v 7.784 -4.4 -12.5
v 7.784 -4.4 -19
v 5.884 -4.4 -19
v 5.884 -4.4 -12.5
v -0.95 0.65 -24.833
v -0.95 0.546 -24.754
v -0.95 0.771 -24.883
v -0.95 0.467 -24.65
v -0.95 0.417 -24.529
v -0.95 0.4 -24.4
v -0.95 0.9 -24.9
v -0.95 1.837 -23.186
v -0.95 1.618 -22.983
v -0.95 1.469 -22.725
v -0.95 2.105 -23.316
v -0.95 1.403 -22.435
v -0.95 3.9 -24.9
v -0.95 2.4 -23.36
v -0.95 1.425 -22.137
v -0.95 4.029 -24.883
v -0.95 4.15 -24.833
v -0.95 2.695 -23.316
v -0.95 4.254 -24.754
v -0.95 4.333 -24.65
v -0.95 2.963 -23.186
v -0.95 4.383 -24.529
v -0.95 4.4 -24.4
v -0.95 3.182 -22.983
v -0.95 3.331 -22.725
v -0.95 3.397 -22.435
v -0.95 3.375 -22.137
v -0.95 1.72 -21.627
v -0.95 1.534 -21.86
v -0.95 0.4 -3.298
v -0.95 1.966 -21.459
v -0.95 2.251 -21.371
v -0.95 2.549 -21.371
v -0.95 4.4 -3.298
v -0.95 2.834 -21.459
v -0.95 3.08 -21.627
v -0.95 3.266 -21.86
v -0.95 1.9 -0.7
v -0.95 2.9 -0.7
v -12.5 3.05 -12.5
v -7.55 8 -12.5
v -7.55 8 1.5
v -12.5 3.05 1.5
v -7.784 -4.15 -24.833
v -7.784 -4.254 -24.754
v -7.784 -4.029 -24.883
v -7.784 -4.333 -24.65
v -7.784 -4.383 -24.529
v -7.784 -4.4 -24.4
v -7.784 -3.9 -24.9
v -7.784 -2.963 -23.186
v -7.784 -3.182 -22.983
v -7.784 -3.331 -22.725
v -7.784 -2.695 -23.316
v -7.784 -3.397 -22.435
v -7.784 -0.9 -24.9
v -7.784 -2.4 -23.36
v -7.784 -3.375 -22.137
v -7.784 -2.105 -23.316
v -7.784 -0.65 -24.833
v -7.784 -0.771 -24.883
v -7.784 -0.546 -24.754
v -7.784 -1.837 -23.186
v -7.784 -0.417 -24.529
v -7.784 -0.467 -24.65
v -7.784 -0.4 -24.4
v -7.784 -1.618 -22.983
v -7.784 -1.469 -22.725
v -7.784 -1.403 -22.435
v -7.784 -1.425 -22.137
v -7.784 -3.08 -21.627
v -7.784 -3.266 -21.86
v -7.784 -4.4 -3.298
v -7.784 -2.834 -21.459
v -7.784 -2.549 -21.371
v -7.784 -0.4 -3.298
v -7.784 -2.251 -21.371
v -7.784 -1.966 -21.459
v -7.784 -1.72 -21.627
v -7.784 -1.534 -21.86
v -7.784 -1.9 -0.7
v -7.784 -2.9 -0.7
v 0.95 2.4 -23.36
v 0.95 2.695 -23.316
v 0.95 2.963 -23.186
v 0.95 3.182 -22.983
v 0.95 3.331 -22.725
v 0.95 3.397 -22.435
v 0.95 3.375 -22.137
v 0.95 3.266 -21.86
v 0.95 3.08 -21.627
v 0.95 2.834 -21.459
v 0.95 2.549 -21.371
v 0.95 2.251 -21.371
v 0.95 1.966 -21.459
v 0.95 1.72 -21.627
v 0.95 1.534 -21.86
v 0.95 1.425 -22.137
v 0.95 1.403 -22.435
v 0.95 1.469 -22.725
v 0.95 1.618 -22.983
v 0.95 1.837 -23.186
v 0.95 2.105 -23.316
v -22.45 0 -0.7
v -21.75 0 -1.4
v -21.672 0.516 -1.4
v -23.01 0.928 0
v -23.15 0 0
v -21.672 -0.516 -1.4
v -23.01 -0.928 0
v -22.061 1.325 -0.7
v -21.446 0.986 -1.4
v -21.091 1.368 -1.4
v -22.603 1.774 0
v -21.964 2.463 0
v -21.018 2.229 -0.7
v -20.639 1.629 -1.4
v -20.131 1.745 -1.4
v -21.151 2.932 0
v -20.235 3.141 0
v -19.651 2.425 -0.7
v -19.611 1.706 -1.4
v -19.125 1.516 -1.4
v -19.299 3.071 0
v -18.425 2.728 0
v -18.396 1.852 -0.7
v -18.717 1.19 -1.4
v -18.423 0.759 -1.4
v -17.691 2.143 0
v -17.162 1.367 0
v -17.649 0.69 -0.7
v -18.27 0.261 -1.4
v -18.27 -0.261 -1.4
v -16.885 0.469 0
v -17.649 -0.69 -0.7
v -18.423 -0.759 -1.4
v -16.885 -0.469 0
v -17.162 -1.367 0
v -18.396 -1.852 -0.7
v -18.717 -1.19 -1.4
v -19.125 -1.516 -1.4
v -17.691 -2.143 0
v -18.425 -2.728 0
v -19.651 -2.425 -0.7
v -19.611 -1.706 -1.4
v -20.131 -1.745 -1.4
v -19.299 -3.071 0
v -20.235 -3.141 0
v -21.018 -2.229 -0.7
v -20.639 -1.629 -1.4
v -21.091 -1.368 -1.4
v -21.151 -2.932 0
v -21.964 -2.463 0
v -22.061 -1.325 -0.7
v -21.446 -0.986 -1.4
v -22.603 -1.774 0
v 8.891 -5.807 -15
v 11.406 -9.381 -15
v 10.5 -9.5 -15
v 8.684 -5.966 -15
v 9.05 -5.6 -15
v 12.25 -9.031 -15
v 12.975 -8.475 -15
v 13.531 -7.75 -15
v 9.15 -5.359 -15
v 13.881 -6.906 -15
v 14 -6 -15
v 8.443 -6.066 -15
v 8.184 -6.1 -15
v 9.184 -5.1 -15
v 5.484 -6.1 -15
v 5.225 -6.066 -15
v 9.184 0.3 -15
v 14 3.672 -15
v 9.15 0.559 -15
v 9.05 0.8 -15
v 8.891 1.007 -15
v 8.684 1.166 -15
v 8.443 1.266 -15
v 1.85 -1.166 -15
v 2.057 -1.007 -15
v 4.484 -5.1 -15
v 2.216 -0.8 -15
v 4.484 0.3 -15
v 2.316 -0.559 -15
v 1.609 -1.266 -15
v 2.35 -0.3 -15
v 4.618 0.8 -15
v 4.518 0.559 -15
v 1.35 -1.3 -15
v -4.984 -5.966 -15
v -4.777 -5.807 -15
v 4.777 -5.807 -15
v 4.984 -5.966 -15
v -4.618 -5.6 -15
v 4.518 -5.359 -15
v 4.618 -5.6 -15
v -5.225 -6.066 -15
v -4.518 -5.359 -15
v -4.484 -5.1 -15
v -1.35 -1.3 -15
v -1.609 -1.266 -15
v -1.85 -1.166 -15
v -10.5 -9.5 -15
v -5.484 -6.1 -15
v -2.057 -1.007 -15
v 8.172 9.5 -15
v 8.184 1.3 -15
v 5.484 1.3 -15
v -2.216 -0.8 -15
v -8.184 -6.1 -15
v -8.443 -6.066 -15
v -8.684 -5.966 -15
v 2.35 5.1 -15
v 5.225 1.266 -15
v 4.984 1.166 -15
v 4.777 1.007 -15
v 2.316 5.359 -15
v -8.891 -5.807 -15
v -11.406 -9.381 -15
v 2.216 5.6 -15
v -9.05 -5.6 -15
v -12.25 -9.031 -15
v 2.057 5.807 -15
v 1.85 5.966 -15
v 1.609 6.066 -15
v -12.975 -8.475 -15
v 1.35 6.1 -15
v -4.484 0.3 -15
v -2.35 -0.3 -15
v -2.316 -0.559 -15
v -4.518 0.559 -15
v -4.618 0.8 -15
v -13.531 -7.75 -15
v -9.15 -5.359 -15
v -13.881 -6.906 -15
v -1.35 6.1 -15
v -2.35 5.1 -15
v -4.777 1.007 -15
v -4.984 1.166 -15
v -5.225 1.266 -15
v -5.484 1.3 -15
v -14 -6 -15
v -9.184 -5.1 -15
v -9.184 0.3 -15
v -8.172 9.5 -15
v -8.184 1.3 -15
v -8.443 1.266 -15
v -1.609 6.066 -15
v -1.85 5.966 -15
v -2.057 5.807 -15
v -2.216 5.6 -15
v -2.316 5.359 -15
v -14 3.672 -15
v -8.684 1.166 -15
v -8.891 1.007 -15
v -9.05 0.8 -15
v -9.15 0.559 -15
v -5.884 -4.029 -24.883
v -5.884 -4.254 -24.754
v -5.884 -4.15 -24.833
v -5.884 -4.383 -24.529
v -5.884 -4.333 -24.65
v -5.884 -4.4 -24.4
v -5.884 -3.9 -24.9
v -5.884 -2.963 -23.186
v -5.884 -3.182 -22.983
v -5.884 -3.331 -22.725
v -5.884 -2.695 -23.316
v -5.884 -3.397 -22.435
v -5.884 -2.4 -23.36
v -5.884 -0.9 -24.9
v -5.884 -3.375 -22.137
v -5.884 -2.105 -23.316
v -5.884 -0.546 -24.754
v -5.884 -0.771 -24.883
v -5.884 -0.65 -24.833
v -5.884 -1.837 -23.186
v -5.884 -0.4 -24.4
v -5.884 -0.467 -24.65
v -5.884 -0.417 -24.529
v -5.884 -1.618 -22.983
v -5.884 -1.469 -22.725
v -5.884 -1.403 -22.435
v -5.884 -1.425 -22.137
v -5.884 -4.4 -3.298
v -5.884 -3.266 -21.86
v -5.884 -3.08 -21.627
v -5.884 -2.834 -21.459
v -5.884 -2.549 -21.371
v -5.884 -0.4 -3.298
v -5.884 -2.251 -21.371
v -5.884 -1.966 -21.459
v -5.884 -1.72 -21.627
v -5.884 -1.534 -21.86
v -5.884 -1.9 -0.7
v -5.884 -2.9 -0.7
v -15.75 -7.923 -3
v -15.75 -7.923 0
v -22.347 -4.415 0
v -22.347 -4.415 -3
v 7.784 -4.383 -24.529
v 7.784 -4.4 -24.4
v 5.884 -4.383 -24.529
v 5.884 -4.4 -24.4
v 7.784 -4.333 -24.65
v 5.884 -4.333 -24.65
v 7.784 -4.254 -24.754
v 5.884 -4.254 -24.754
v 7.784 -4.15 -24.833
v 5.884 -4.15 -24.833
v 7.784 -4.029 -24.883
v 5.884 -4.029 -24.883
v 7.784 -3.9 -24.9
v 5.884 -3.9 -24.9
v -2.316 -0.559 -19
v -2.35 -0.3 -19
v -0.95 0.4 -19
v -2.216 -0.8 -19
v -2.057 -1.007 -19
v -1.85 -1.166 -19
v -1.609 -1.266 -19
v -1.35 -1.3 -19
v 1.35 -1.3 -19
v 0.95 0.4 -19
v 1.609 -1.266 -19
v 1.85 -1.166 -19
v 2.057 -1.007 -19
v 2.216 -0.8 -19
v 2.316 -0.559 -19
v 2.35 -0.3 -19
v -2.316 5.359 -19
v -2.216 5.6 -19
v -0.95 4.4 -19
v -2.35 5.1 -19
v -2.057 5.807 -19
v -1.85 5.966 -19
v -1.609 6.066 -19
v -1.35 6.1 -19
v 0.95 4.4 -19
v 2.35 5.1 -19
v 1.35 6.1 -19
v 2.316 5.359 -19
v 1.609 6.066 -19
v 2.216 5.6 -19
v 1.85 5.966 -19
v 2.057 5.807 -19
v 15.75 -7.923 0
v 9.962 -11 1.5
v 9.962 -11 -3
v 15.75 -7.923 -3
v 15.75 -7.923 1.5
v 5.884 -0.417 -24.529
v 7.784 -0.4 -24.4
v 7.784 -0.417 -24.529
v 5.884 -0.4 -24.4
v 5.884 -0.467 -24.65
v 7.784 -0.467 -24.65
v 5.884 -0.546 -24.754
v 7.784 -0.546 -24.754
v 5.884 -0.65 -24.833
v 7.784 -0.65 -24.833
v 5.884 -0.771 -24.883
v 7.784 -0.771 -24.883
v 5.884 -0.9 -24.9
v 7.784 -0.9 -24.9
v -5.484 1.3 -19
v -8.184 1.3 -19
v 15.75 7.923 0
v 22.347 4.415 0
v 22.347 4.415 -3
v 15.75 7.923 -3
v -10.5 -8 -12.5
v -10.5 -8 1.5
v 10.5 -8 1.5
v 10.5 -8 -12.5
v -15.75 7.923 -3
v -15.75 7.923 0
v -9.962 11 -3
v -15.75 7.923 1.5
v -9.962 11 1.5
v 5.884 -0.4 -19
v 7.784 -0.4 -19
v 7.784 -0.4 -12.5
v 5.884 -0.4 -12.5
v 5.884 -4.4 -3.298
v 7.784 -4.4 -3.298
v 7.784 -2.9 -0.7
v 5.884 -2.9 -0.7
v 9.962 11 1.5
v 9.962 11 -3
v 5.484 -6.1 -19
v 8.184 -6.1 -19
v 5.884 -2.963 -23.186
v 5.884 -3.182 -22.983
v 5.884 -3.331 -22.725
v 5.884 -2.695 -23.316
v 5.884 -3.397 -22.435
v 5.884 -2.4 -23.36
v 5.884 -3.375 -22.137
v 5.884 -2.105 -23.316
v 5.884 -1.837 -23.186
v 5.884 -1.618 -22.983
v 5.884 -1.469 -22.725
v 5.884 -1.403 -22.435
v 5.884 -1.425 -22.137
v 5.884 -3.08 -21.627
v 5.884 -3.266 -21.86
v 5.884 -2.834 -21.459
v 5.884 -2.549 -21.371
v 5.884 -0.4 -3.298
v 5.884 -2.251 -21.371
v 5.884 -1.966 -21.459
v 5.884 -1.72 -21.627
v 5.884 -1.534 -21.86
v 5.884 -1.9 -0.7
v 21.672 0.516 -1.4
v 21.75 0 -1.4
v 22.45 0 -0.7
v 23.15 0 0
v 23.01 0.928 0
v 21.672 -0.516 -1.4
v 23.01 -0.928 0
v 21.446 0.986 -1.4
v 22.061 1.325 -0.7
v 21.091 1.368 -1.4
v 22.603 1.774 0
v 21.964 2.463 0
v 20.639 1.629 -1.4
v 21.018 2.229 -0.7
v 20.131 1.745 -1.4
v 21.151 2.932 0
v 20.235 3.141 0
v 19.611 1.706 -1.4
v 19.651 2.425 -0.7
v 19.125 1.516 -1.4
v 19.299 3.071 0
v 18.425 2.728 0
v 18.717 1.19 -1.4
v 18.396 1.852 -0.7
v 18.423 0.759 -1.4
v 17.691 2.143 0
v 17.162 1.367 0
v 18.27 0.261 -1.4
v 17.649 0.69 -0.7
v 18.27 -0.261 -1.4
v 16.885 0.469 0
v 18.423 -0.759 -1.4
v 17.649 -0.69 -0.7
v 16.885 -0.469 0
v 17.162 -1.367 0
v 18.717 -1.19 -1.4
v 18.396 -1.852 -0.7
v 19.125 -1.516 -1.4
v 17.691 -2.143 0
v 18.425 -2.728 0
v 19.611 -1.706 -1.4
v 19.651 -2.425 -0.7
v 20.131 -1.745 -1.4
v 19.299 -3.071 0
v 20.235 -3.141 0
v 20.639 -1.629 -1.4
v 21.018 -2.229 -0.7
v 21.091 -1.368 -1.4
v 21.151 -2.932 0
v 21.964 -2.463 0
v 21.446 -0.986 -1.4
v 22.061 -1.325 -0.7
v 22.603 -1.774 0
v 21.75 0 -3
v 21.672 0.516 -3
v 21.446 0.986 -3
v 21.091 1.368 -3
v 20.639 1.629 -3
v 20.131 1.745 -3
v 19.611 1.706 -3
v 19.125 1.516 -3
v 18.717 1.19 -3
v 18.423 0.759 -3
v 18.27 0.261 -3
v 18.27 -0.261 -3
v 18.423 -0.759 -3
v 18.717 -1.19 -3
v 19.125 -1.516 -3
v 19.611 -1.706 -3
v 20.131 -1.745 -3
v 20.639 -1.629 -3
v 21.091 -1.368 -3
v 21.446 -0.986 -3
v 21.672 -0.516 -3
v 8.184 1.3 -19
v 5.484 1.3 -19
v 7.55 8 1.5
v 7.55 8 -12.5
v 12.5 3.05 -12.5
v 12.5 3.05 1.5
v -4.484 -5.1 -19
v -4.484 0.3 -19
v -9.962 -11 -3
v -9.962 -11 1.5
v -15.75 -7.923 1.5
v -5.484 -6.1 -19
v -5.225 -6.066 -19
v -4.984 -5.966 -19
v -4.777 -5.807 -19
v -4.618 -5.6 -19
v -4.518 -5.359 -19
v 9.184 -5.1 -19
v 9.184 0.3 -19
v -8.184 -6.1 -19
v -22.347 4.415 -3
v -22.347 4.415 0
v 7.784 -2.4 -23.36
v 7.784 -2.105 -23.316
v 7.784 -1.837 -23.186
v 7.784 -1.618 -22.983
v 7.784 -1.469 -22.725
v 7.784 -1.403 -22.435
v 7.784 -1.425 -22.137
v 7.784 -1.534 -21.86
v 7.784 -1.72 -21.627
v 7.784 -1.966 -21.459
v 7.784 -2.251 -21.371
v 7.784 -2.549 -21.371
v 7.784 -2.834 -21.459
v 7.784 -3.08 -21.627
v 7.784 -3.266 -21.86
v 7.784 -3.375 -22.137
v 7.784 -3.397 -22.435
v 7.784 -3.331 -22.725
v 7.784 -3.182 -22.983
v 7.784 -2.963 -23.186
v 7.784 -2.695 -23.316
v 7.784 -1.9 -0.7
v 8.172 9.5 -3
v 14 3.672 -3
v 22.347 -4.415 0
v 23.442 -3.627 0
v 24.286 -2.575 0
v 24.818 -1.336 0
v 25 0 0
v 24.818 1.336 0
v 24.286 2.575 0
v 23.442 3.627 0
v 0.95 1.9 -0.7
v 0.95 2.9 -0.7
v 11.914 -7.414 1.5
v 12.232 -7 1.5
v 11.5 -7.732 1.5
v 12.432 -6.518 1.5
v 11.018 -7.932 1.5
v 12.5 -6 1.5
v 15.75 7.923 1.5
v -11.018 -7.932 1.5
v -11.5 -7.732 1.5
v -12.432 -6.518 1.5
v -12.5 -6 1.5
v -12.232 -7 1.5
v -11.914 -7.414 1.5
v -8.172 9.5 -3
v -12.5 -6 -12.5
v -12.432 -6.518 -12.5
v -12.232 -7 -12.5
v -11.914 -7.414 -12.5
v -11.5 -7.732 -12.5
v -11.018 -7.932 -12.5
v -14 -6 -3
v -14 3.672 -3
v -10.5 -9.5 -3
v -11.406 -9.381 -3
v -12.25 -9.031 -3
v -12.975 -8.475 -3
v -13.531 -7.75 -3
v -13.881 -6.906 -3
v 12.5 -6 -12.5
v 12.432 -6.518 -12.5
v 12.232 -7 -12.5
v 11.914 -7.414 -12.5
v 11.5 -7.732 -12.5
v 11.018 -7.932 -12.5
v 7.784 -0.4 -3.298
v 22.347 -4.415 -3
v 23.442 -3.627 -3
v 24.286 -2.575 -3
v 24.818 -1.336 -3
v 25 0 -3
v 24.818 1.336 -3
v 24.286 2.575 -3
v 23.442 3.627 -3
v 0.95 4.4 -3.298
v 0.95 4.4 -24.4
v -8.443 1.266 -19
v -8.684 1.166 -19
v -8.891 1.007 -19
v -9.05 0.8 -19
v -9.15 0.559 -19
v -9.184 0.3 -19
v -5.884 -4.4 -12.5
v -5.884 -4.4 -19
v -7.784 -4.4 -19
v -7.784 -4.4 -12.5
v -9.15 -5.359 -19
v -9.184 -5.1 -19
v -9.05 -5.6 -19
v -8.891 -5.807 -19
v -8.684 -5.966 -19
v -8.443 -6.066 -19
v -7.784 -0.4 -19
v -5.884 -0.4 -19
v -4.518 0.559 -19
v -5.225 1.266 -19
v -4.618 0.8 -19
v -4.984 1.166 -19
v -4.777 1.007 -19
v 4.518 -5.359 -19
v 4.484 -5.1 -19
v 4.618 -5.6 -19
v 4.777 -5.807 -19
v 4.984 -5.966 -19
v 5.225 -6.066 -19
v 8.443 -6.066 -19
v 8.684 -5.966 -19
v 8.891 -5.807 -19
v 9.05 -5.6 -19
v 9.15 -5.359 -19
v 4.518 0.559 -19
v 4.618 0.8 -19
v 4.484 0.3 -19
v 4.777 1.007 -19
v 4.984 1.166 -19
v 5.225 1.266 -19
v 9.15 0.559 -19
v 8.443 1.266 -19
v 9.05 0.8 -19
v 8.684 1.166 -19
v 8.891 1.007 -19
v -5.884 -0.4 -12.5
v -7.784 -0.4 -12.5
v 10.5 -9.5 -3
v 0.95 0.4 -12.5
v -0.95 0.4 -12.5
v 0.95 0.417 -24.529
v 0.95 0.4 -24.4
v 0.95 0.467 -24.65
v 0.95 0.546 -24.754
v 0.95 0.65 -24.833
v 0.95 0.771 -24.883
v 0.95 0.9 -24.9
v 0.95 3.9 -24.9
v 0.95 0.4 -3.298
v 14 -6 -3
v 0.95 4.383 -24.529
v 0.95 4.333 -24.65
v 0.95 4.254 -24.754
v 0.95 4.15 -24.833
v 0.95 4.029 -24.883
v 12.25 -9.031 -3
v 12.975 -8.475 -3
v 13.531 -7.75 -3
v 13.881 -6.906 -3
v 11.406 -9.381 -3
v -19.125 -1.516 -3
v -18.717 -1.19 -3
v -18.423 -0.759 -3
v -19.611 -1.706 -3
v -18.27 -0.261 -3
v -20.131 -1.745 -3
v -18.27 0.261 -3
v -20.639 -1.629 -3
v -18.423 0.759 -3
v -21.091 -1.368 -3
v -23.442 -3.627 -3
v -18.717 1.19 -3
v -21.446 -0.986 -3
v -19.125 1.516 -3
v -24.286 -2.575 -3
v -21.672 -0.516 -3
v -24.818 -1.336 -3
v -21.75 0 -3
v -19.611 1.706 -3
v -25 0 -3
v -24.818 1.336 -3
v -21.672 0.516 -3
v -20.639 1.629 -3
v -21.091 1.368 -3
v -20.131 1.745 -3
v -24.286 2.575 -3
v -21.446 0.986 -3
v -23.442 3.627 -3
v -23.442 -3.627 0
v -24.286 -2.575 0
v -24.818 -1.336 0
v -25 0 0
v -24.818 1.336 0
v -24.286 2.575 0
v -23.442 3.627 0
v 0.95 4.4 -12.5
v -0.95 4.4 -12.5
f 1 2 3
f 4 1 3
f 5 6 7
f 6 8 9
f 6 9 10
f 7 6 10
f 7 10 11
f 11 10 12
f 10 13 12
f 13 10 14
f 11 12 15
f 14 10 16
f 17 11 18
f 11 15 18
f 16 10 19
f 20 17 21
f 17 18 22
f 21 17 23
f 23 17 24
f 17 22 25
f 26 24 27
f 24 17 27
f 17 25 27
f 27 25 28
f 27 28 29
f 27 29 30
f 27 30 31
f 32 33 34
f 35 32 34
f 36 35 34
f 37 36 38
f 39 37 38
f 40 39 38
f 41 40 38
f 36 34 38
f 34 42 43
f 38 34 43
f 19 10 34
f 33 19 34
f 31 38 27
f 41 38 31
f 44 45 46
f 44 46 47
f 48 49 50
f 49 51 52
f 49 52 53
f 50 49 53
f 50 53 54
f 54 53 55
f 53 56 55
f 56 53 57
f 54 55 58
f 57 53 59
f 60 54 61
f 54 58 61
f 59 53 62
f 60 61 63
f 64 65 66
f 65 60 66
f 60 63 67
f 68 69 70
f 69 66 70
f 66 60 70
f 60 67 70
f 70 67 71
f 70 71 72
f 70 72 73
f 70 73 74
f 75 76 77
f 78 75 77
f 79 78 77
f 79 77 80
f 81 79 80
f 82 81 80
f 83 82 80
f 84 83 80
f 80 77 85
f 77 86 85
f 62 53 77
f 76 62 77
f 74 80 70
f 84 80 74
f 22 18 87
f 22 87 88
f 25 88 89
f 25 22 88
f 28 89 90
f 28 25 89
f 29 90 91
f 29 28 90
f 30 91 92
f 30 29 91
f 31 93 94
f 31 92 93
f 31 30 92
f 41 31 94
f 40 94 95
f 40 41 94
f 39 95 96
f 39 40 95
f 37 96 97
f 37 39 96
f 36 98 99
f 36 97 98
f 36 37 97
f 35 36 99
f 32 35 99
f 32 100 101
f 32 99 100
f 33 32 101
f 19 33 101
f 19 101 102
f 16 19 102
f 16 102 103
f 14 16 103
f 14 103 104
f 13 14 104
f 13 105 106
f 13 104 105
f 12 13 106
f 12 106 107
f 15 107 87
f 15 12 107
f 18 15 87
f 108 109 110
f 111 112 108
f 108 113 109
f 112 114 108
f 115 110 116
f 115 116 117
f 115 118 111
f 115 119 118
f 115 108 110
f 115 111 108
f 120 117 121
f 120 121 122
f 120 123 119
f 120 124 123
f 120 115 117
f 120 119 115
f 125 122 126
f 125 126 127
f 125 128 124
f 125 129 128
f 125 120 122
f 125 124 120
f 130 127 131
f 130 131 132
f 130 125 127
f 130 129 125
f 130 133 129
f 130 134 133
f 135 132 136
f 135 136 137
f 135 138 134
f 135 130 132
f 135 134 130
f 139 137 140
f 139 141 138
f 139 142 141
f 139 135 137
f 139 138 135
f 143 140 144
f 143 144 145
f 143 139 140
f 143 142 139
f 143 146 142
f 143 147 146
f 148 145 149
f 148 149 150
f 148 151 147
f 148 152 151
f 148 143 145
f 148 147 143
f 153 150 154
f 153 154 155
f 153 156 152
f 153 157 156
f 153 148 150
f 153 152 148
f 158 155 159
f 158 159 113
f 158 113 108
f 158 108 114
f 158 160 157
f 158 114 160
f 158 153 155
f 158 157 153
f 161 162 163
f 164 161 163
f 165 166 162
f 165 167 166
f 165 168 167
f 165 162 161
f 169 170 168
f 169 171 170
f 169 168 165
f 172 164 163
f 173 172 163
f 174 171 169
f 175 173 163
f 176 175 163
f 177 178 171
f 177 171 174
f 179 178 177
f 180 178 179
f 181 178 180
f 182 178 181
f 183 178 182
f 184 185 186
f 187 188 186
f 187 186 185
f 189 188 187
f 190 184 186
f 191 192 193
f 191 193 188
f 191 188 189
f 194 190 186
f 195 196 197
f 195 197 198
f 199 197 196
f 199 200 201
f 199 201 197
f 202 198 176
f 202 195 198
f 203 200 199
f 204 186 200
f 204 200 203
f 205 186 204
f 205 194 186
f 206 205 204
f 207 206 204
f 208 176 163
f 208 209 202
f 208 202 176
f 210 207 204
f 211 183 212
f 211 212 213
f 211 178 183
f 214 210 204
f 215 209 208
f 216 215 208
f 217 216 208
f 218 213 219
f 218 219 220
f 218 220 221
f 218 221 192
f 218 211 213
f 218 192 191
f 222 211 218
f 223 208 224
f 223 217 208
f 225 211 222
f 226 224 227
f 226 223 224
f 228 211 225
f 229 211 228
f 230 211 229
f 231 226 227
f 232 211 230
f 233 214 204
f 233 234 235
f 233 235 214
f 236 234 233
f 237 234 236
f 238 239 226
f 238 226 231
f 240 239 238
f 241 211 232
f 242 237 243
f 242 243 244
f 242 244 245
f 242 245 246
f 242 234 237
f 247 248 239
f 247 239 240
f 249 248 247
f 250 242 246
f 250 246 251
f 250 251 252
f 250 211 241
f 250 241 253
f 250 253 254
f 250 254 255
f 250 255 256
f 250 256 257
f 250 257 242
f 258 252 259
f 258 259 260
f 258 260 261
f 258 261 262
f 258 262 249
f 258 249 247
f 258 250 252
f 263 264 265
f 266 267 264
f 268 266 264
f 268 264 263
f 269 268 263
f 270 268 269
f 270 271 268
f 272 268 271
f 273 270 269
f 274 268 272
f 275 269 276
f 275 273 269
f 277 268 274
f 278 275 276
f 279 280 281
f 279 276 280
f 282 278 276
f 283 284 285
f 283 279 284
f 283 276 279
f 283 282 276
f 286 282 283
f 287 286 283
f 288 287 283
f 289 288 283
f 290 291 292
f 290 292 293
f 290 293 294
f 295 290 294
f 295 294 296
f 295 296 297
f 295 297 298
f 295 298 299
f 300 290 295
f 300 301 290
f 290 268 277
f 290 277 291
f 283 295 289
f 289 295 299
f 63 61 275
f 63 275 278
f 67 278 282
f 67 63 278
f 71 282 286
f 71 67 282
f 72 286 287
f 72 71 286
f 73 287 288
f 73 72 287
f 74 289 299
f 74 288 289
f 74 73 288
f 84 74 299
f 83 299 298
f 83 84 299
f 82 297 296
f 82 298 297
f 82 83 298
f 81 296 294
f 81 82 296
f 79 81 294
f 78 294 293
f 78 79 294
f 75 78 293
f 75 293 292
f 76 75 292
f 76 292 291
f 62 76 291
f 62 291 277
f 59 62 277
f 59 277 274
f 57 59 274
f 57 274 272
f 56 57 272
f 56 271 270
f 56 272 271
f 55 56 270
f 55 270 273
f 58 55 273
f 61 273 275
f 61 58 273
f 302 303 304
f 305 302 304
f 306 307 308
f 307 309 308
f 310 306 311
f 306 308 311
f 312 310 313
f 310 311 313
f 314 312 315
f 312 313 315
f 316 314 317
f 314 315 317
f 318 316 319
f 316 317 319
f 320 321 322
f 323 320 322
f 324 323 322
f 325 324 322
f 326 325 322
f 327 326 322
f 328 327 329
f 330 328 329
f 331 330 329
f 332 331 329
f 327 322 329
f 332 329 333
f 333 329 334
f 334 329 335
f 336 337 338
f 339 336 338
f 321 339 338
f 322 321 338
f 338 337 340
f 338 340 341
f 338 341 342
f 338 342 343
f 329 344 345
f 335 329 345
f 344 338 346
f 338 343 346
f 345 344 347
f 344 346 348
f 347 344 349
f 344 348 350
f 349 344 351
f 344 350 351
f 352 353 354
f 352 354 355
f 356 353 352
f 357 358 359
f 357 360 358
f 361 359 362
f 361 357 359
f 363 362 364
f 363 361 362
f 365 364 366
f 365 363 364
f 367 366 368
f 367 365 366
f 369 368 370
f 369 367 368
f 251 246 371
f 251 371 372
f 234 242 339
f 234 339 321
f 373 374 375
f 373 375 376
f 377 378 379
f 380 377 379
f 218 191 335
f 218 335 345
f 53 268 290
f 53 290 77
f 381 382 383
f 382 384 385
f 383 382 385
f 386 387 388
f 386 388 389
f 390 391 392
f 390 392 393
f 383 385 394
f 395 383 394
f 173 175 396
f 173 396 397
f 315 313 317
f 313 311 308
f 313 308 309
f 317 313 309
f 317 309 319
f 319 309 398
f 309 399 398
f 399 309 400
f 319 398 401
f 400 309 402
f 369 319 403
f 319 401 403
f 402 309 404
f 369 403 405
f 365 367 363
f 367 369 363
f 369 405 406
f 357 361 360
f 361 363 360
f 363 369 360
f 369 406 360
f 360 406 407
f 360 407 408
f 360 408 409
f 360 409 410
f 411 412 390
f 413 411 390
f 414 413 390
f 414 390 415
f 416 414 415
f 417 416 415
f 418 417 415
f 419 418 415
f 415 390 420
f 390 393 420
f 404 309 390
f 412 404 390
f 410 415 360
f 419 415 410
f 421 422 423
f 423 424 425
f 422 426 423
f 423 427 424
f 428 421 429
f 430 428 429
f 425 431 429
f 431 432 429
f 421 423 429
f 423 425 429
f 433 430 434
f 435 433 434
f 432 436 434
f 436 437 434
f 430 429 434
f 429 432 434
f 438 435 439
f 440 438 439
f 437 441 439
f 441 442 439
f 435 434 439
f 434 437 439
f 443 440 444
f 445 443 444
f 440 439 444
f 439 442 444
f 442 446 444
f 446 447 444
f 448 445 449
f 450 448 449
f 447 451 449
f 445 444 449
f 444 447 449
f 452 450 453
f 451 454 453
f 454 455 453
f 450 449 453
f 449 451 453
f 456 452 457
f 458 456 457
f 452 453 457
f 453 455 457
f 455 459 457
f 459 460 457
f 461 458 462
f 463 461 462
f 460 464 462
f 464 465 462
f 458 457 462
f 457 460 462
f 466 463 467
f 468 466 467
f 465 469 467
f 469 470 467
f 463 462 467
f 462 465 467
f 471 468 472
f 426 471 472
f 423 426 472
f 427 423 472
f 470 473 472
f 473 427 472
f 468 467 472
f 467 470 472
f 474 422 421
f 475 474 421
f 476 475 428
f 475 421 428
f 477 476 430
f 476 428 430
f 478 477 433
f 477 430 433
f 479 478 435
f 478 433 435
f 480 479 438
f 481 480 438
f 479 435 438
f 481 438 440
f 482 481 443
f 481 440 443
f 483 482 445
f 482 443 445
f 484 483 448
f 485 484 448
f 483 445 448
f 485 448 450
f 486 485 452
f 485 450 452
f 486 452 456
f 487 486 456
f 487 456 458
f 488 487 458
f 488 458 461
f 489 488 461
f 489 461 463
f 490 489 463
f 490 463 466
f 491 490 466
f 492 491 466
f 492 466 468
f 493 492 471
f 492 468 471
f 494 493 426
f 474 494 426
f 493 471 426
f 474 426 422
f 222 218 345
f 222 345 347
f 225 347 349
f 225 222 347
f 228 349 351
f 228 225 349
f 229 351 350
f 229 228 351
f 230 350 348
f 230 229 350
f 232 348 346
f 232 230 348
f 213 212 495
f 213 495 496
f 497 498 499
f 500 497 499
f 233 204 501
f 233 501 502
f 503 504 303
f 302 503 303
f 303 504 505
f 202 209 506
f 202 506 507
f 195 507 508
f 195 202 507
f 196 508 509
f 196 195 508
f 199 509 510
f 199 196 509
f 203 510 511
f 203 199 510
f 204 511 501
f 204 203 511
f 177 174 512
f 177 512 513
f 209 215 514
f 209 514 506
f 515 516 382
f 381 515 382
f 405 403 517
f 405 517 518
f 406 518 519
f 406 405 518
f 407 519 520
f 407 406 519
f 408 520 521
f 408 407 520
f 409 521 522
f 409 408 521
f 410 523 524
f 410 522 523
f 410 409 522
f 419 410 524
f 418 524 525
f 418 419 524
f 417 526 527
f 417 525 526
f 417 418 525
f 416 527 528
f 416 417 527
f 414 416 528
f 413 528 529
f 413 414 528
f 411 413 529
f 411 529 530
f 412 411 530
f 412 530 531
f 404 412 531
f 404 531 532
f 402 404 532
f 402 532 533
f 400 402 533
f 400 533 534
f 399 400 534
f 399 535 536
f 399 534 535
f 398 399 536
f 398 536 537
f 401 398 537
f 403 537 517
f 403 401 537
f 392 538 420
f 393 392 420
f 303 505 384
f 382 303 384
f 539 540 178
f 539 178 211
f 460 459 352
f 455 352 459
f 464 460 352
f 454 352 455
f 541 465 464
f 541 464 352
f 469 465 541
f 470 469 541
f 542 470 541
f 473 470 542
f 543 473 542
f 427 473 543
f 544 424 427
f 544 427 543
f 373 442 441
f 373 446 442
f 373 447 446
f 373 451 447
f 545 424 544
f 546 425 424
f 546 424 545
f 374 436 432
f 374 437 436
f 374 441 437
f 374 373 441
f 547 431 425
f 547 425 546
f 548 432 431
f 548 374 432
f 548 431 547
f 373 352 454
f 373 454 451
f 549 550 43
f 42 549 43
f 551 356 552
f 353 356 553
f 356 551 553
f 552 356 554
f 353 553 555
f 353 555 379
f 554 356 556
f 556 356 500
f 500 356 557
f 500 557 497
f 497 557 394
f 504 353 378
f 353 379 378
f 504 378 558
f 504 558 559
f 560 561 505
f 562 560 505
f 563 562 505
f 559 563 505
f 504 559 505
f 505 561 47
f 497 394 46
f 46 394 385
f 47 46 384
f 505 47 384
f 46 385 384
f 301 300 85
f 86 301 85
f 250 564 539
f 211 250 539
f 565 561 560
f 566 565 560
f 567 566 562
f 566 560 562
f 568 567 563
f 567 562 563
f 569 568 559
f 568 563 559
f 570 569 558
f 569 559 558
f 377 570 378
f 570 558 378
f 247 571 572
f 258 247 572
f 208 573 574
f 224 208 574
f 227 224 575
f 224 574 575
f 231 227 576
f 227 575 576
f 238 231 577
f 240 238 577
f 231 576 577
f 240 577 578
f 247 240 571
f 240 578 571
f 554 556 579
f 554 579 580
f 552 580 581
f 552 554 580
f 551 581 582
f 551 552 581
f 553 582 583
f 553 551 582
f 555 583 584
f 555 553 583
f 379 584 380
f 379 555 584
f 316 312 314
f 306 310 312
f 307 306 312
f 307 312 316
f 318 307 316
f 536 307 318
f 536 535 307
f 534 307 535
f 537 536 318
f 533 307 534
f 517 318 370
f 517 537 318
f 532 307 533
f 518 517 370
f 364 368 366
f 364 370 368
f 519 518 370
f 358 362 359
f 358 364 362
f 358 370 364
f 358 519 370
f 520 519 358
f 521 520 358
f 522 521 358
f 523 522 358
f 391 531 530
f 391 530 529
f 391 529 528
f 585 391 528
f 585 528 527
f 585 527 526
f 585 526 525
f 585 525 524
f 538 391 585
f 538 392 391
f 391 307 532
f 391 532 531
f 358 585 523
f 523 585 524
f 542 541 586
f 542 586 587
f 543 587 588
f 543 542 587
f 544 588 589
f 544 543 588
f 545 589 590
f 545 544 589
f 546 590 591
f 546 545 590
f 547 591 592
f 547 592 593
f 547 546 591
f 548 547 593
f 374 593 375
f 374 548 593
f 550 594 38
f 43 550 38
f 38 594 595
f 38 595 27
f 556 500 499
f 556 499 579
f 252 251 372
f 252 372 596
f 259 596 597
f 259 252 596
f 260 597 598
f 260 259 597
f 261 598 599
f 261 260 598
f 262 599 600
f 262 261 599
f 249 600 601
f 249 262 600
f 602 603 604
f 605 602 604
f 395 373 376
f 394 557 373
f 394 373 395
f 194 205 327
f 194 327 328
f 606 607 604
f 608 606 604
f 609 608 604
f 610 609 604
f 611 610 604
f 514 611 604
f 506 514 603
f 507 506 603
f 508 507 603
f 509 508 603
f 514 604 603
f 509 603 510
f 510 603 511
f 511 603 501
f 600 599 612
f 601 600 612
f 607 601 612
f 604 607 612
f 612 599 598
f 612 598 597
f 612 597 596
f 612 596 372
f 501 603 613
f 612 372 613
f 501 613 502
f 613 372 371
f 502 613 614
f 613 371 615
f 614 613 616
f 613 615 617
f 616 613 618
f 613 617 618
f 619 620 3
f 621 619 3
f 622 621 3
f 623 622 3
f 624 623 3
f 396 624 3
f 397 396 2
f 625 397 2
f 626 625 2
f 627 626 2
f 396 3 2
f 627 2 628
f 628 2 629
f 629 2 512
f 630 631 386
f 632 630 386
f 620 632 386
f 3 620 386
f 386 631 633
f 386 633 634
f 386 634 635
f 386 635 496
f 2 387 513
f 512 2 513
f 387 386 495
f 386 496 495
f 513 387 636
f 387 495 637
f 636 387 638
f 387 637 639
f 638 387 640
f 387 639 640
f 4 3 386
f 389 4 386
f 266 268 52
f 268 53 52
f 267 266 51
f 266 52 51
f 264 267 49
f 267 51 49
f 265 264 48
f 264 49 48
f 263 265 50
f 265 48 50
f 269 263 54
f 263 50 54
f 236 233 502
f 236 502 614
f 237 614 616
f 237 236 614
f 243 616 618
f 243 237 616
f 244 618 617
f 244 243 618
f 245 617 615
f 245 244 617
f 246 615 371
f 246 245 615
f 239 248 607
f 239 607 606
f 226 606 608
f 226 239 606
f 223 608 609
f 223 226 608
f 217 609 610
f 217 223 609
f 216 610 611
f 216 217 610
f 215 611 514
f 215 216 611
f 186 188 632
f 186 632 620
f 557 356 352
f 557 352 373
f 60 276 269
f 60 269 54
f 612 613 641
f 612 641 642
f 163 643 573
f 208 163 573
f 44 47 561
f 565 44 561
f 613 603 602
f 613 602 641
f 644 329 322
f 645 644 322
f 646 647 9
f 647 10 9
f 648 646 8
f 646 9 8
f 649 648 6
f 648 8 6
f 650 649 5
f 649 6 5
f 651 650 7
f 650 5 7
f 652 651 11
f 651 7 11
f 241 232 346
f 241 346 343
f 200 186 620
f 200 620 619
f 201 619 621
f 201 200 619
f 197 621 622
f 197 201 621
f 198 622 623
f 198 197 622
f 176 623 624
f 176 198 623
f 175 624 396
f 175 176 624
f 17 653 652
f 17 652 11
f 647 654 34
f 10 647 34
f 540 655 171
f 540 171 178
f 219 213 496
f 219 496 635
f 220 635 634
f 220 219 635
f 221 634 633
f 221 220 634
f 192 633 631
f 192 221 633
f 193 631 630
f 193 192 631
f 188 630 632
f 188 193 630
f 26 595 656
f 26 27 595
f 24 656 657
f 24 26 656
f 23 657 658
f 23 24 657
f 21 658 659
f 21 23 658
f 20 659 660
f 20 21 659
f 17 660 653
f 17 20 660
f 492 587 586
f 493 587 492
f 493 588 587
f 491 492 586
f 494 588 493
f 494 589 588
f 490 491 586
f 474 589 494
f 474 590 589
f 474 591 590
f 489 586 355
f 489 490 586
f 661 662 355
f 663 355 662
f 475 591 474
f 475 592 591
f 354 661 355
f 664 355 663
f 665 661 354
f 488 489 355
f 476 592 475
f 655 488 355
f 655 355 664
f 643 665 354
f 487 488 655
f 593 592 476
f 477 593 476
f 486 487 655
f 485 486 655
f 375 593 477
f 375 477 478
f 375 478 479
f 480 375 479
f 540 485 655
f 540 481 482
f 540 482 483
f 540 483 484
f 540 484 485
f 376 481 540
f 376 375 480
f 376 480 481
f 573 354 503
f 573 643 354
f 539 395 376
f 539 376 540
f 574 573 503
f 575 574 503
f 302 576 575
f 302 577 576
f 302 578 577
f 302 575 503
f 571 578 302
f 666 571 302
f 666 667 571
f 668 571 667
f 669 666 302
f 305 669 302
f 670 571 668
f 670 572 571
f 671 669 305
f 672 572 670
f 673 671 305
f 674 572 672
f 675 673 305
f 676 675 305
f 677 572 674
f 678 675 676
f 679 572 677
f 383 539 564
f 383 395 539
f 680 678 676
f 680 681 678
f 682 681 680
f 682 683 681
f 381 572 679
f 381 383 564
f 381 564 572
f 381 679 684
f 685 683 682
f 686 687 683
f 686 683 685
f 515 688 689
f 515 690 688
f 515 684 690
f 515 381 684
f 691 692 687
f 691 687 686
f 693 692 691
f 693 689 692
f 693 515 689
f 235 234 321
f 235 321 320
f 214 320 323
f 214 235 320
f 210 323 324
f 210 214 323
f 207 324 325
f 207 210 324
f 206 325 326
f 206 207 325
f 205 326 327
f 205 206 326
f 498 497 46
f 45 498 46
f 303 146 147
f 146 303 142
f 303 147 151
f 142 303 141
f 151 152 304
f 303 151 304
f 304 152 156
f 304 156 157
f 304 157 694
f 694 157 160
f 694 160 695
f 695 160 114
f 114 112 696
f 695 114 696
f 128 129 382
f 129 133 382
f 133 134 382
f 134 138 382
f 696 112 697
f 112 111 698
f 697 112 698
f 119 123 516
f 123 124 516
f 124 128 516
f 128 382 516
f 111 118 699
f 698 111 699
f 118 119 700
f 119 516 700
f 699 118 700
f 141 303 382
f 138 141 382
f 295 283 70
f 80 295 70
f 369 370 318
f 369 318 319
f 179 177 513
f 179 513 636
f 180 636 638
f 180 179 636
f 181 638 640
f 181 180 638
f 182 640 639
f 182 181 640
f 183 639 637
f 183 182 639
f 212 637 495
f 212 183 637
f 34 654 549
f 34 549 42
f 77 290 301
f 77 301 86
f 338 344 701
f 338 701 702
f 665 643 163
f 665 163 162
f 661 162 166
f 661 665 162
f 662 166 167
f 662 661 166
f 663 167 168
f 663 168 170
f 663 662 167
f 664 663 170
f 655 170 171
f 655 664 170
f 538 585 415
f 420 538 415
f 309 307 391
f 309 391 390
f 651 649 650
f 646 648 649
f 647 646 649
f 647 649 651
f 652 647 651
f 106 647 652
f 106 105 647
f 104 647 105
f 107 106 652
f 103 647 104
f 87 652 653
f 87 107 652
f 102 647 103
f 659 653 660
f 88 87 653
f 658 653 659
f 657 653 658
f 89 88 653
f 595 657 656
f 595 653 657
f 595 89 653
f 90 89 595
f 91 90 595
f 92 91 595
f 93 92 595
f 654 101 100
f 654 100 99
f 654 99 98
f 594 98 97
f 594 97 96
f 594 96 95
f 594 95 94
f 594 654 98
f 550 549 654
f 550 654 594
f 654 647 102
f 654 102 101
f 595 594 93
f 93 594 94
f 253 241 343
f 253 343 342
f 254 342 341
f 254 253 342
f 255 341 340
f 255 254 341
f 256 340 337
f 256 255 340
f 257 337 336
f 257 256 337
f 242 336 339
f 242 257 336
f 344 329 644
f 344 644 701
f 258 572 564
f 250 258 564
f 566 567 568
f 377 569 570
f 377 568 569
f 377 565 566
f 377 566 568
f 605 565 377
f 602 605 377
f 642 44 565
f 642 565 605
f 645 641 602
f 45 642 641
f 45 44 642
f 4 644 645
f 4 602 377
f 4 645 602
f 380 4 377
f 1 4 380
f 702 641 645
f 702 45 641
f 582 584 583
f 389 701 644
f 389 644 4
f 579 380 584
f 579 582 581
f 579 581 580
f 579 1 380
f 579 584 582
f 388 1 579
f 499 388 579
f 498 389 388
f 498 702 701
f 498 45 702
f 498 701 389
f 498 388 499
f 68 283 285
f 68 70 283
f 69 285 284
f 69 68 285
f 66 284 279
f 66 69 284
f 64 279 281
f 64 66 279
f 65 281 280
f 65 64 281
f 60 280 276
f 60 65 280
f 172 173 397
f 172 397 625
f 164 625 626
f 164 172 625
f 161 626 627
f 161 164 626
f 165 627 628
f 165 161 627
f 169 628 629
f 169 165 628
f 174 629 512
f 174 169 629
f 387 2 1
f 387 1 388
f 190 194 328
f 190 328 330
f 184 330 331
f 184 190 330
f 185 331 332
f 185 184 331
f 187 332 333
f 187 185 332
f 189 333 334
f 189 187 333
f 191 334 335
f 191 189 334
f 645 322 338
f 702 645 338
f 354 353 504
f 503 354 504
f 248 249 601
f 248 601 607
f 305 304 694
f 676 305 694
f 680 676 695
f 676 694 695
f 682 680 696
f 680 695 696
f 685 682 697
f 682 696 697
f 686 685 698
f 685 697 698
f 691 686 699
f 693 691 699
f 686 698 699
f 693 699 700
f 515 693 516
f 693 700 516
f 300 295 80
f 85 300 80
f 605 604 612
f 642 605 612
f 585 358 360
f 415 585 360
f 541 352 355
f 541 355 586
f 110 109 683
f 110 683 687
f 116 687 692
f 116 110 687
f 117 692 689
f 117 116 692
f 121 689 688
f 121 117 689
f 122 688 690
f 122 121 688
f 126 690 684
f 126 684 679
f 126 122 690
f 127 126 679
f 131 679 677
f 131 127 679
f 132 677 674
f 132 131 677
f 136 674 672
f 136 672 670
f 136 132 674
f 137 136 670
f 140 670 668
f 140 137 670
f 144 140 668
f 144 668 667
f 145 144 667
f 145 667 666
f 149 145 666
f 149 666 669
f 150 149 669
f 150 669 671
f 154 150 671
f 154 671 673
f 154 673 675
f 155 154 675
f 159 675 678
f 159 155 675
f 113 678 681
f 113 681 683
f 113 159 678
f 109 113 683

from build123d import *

# Parameters (mm, degrees)
SKETCH1_R                  = 1.75
BOSS_EXTRUDE1_DEPTH        = 3
BOSS_EXTRUDE2_START        = 1.5
BOSS_EXTRUDE2_DEPTH        = 1.5
BOSS_EXTRUDE3_DEPTH        = 15
BOSS_EXTRUDE4_START        = -2.5
BOSS_EXTRUDE4_DEPTH        = 2.5
CHAMFER2_SIZE              = 1.4
SKETCH4_W                  = 1.9
SKETCH4_H                  = 4
BOSS_EXTRUDE5_DEPTH        = 4
SKETCH4_2_W                = 1.9
SKETCH4_2_H                = 4
CUT_EXTRUDE1_DEPTH         = 32.910029771
BOSS_EXTRUDE6_DEPTH        = 9.9
BOSS_EXTRUDE6_DEPTH_BACK   = 14.3
SKETCH4_3_W                = 1.9
SKETCH4_3_H                = 4
BOSS_EXTRUDE6_2_DEPTH      = 9.9
BOSS_EXTRUDE6_2_DEPTH_BACK = 14.3
BOSS_EXTRUDE6_3_DEPTH      = 9.9
BOSS_EXTRUDE6_3_DEPTH_BACK = 14.3
FILLET1_R                  = 0.5
FILLET2_R                  = 0.5
FILLET3_R                  = 0.5
CUT_EXTRUDE2_DEPTH         = 37.959572508
CUT_EXTRUDE2_DEPTH_BACK    = 37.959572508
SKETCH5_R                  = 1
CHAMFER3_SIZE              = 1.5
CHAMFER3_SIZE2             = 2.598076211
CHAMFER4_SIZE              = 1.5
CHAMFER4_SIZE2             = 2.598076211
CHAMFER5_SIZE              = 1.5
CHAMFER5_SIZE2             = 2.598076211


with BuildPart() as part:
    # Sketch1 → Boss-Extrude1 (new body)
    # profile 1 of 3: a face of its own
    with BuildSketch(Plane.XY):
        with BuildLine():
            Line((15.75, 7.922615338), (9.962281222, 11))
            Line((9.962281222, 11), (0, 11))
            Line((0, 11), (0, 9.5))
            Line((0, 9.5), (8.171572875, 9.5))
            Line((8.171572875, 9.5), (14, 3.671572875))
            Line((14, 3.671572875), (14, -6))
            ThreePointArc((14, -6), (12.974873734, -8.474873734), (10.5, -9.5))
            Line((10.5, -9.5), (0, -9.5))
            Line((0, -9.5), (0, -11))
            Line((0, -11), (9.962281222, -11))
            Line((9.962281222, -11), (15.75, -7.922615338))
            Line((15.75, -7.922615338), (15.75, 7.922615338))
        make_face()
    # profile 2 of 3: a face of its own
    with BuildSketch(Plane.XY):
        with BuildLine():
            Line((8.171572875, 9.5), (0, 9.5))
            Line((0, 9.5), (0, 8))
            Line((0, 8), (7.550252532, 8))
            Line((7.550252532, 8), (12.5, 3.050252532))
            Line((12.5, 3.050252532), (12.5, -6))
            ThreePointArc((12.5, -6), (11.914213562, -7.414213562), (10.5, -8))
            Line((10.5, -8), (0, -8))
            Line((0, -8), (0, -9.5))
            Line((0, -9.5), (10.5, -9.5))
            ThreePointArc((10.5, -9.5), (12.974873734, -8.474873734), (14, -6))
            Line((14, -6), (14, 3.671572875))
            Line((14, 3.671572875), (8.171572875, 9.5))
        make_face()
    # profile 3 of 3: a face of its own
    with BuildSketch(Plane.XY):
        with BuildLine():
            Line((22.347357814, 4.414737964), (15.75, 7.922615338))
            Line((15.75, 7.922615338), (15.75, -7.922615338))
            Line((15.75, -7.922615338), (22.347357814, -4.414737964))
            ThreePointArc((22.347357814, -4.414737964), (25, 0), (22.347357814, 4.414737964))
        make_face()
        with Locations((20, 0)):
            Circle(SKETCH1_R, mode=Mode.SUBTRACT)
    extrude(amount=-BOSS_EXTRUDE1_DEPTH)

    # Sketch1<3> → Boss-Extrude2 (add)
    with BuildSketch(Plane.XY.offset(BOSS_EXTRUDE2_START)):
        with BuildLine():
            Line((8.171572875, 9.5), (0, 9.5))
            Line((0, 9.5), (0, 8))
            Line((0, 8), (7.550252532, 8))
            Line((7.550252532, 8), (12.5, 3.050252532))
            Line((12.5, 3.050252532), (12.5, -6))
            ThreePointArc((12.5, -6), (11.914213562, -7.414213562), (10.5, -8))
            Line((10.5, -8), (0, -8))
            Line((0, -8), (0, -9.5))
            Line((0, -9.5), (10.5, -9.5))
            ThreePointArc((10.5, -9.5), (12.974873734, -8.474873734), (14, -6))
            Line((14, -6), (14, 3.671572875))
            Line((14, 3.671572875), (8.171572875, 9.5))
        make_face()
        with BuildLine():
            Line((15.75, 7.922615338), (9.962281222, 11))
            Line((9.962281222, 11), (0, 11))
            Line((0, 11), (0, 9.5))
            Line((0, 9.5), (8.171572875, 9.5))
            Line((8.171572875, 9.5), (14, 3.671572875))
            Line((14, 3.671572875), (14, -6))
            ThreePointArc((14, -6), (12.974873734, -8.474873734), (10.5, -9.5))
            Line((10.5, -9.5), (0, -9.5))
            Line((0, -9.5), (0, -11))
            Line((0, -11), (9.962281222, -11))
            Line((9.962281222, -11), (15.75, -7.922615338))
            Line((15.75, -7.922615338), (15.75, 7.922615338))
        make_face()
    extrude(amount=-BOSS_EXTRUDE2_DEPTH)

    # Sketch1<4> → Boss-Extrude3 (add)
    with BuildSketch(Plane.XY):
        with BuildLine():
            Line((8.171572875, 9.5), (0, 9.5))
            Line((0, 9.5), (0, 8))
            Line((0, 8), (7.550252532, 8))
            Line((7.550252532, 8), (12.5, 3.050252532))
            Line((12.5, 3.050252532), (12.5, -6))
            ThreePointArc((12.5, -6), (11.914213562, -7.414213562), (10.5, -8))
            Line((10.5, -8), (0, -8))
            Line((0, -8), (0, -9.5))
            Line((0, -9.5), (10.5, -9.5))
            ThreePointArc((10.5, -9.5), (12.974873734, -8.474873734), (14, -6))
            Line((14, -6), (14, 3.671572875))
            Line((14, 3.671572875), (8.171572875, 9.5))
        make_face()
    extrude(amount=-BOSS_EXTRUDE3_DEPTH)

    # Sketch2 → Boss-Extrude4 (add)
    with BuildSketch(Plane(origin=(0, 0, -15), x_dir=(-1, 0, 0), z_dir=(0, 0, -1)).offset(BOSS_EXTRUDE4_START)):
        with BuildLine():
            Line((0, 9.5), (-8.171572875, 9.5))
            Line((-8.171572875, 9.5), (-14, 3.671572875))
            Line((-14, 3.671572875), (-14, -6))
            ThreePointArc((-14, -6), (-12.974873734, -8.474873734), (-10.5, -9.5))
            Line((-10.5, -9.5), (0, -9.5))
            Line((0, -9.5), (0, 9.5))
        make_face()
    extrude(amount=BOSS_EXTRUDE4_DEPTH)

    # Chamfer2
    chamfer2_edges = [part.edges().sort_by_distance(p)[0] for p in [
        (18.25, 0, 0),
    ]]
    chamfer(chamfer2_edges, length=CHAMFER2_SIZE)

    # Mirror1: part across plane


with BuildPart() as part_1:
    add(part.part)
    add(part.part.mirror(Plane(origin=(0, 0, 0), x_dir=(0, 0, 1), z_dir=(1, 0, 0))))

    # Sketch4 → Boss-Extrude5 (add)
    # profile 1 of 3: a face of its own
    with BuildSketch(Plane(origin=(0, 0, -15), x_dir=(-1, 0, 0), z_dir=(0, 0, -1))):
        with BuildLine():
            Line((-1.35, 6.1), (1.35, 6.1))
            ThreePointArc((1.35, 6.1), (2.057106781, 5.807106781), (2.35, 5.1))
            Line((2.35, 5.1), (2.35, -0.3))
            ThreePointArc((2.35, -0.3), (2.057106781, -1.007106781), (1.35, -1.3))
            Line((1.35, -1.3), (-1.35, -1.3))
            ThreePointArc((-1.35, -1.3), (-2.057106781, -1.007106781), (-2.35, -0.3))
            Line((-2.35, -0.3), (-2.35, 5.1))
            ThreePointArc((-2.35, 5.1), (-2.057106781, 5.807106781), (-1.35, 6.1))
        make_face()
        with Locations((0, 2.4)):
            Rectangle(SKETCH4_W, SKETCH4_H, mode=Mode.SUBTRACT)
    # profile 2 of 3: a face of its own
    with BuildSketch(Plane(origin=(0, 0, -15), x_dir=(-1, 0, 0), z_dir=(0, 0, -1))):
        with BuildLine():
            Line((-8.184232728, 1.3), (-5.484232728, 1.3))
            ThreePointArc((-5.484232728, 1.3), (-4.777125947, 1.007106781), (-4.484232728, 0.3))
            Line((-4.484232728, 0.3), (-4.484232728, -5.1))
            ThreePointArc((-4.484232728, -5.1), (-4.777125947, -5.807106781), (-5.484232728, -6.1))
            Line((-5.484232728, -6.1), (-8.184232728, -6.1))
            ThreePointArc((-8.184232728, -6.1), (-8.891339509, -5.807106781), (-9.184232728, -5.1))
            Line((-9.184232728, -5.1), (-9.184232728, 0.3))
            ThreePointArc((-9.184232728, 0.3), (-8.891339509, 1.007106781), (-8.184232728, 1.3))
        make_face()
        with Locations((-6.834232728, -2.4)):
            Rectangle(SKETCH4_W, SKETCH4_H, mode=Mode.SUBTRACT)
    # profile 3 of 3: a face of its own
    with BuildSketch(Plane(origin=(0, 0, -15), x_dir=(-1, 0, 0), z_dir=(0, 0, -1))):
        with BuildLine():
            Line((5.484232728, 1.3), (8.184232728, 1.3))
            ThreePointArc((8.184232728, 1.3), (8.891339509, 1.007106781), (9.184232728, 0.3))
            Line((9.184232728, 0.3), (9.184232728, -5.1))
            ThreePointArc((9.184232728, -5.1), (8.891339509, -5.807106781), (8.184232728, -6.1))
            Line((8.184232728, -6.1), (5.484232728, -6.1))
            ThreePointArc((5.484232728, -6.1), (4.777125947, -5.807106781), (4.484232728, -5.1))
            Line((4.484232728, -5.1), (4.484232728, 0.3))
            ThreePointArc((4.484232728, 0.3), (4.777125947, 1.007106781), (5.484232728, 1.3))
        make_face()
        with Locations((6.834232728, -2.4)):
            Rectangle(SKETCH4_W, SKETCH4_H, mode=Mode.SUBTRACT)
    extrude(amount=BOSS_EXTRUDE5_DEPTH)

    # Sketch4<2> → Cut-Extrude1 (cut, through all)
    with BuildSketch(Plane(origin=(0, 0, -15), x_dir=(-1, 0, 0), z_dir=(0, 0, -1))):
        with Locations((-6.834232728, -2.4)):
            Rectangle(SKETCH4_2_W, SKETCH4_2_H)
        with Locations((0, 2.4)):
            Rectangle(SKETCH4_2_W, SKETCH4_2_H)
        with Locations((6.834232728, -2.4)):
            Rectangle(SKETCH4_2_W, SKETCH4_2_H)
    extrude(amount=-CUT_EXTRUDE1_DEPTH, mode=Mode.SUBTRACT)


with BuildPart() as body_2:
    # Sketch4<3> → Boss-Extrude6 (new, two sides: drawn at the far end of the back side and taken through both)
    with BuildSketch(Plane(origin=(0, 0, -15), x_dir=(-1, 0, 0), z_dir=(0, 0, -1)).offset(-BOSS_EXTRUDE6_DEPTH_BACK)):
        with Locations((-6.834232728, -2.4)):
            Rectangle(SKETCH4_3_W, SKETCH4_3_H)
    extrude(amount=BOSS_EXTRUDE6_DEPTH + BOSS_EXTRUDE6_DEPTH_BACK)

    # Fillet1
    fillet1_edges = [body_2.edges().sort_by_distance(p)[0] for p in [
        (6.834232728, -0.4, -24.9),
        (6.834232728, -4.4, -24.9),
    ]]
    fillet(fillet1_edges, radius=FILLET1_R)


with BuildPart() as body_3:
    # Sketch4<3> → Boss-Extrude6 2 (new, two sides: drawn at the far end of the back side and taken through both)
    with BuildSketch(Plane(origin=(0, 0, -15), x_dir=(-1, 0, 0), z_dir=(0, 0, -1)).offset(-BOSS_EXTRUDE6_2_DEPTH_BACK)):
        with Locations((0, 2.4)):
            Rectangle(SKETCH4_3_W, SKETCH4_3_H)
    extrude(amount=BOSS_EXTRUDE6_2_DEPTH + BOSS_EXTRUDE6_2_DEPTH_BACK)

    # Fillet2
    fillet2_edges = [body_3.edges().sort_by_distance(p)[0] for p in [
        (0, 4.4, -24.9),
        (0, 0.4, -24.9),
    ]]
    fillet(fillet2_edges, radius=FILLET2_R)


with BuildPart() as body_4:
    # Sketch4<3> → Boss-Extrude6 3 (new, two sides: drawn at the far end of the back side and taken through both)
    with BuildSketch(Plane(origin=(0, 0, -15), x_dir=(-1, 0, 0), z_dir=(0, 0, -1)).offset(-BOSS_EXTRUDE6_3_DEPTH_BACK)):
        with Locations((6.834232728, -2.4)):
            Rectangle(SKETCH4_3_W, SKETCH4_3_H)
    extrude(amount=BOSS_EXTRUDE6_3_DEPTH + BOSS_EXTRUDE6_3_DEPTH_BACK)

    # Fillet3
    fillet3_edges = [body_4.edges().sort_by_distance(p)[0] for p in [
        (-6.834232728, -0.4, -24.9),
        (-6.834232728, -4.4, -24.9),
    ]]
    fillet(fillet3_edges, radius=FILLET3_R)


with BuildPart() as cut_extrude2_tool:
    # Sketch5 → Cut-Extrude2 (new, two sides: drawn at the far end of the back side and taken through both)
    with BuildSketch(Plane(origin=(0, 0, 0), x_dir=(0, 0, -1), z_dir=(1, 0, 0)).offset(-CUT_EXTRUDE2_DEPTH_BACK)):
        with Locations((22.36, 2.4)):
            Circle(SKETCH5_R)
        with Locations((22.36, -2.4)):
            Circle(SKETCH5_R)
    extrude(amount=CUT_EXTRUDE2_DEPTH + CUT_EXTRUDE2_DEPTH_BACK)


with BuildPart() as body_2_1:
    add(body_2.part)

    # Cut-Extrude2: cut by cut_extrude2_tool
    add(cut_extrude2_tool.part, mode=Mode.SUBTRACT)

    # Chamfer5
    chamfer5_edges = [body_2_1.edges().sort_by_distance(p)[0] for p in [
        (6.834232728, -4.4, -0.7),
        (6.834232728, -0.4, -0.7),
    ]]
    chamfer5_side = [body_2_1.faces().sort_by_distance(p)[0] for p in [
        (6.834232728, -2.4, -0.7),
    ]]
    chamfer(chamfer5_edges, length=CHAMFER5_SIZE, length2=CHAMFER5_SIZE2, reference=chamfer5_side[0])


with BuildPart() as body_3_1:
    add(body_3.part)

    # Cut-Extrude2: cut by cut_extrude2_tool
    add(cut_extrude2_tool.part, mode=Mode.SUBTRACT)

    # Chamfer4
    chamfer4_edges = [body_3_1.edges().sort_by_distance(p)[0] for p in [
        (0, 0.4, -0.7),
        (0, 4.4, -0.7),
    ]]
    chamfer4_side = [body_3_1.faces().sort_by_distance(p)[0] for p in [
        (0, 2.4, -0.7),
    ]]
    chamfer(chamfer4_edges, length=CHAMFER4_SIZE, length2=CHAMFER4_SIZE2, reference=chamfer4_side[0])


with BuildPart() as body_4_1:
    add(body_4.part)

    # Cut-Extrude2: cut by cut_extrude2_tool
    add(cut_extrude2_tool.part, mode=Mode.SUBTRACT)

    # Chamfer3
    chamfer3_edges = [body_4_1.edges().sort_by_distance(p)[0] for p in [
        (-6.834232728, -4.4, -0.7),
        (-6.834232728, -0.4, -0.7),
    ]]
    chamfer3_side = [body_4_1.faces().sort_by_distance(p)[0] for p in [
        (-6.834232728, -2.4, -0.7),
    ]]
    chamfer(chamfer3_edges, length=CHAMFER3_SIZE, length2=CHAMFER3_SIZE2, reference=chamfer3_side[0])


solid = Compound([part_1.part, body_2_1.part, body_3_1.part, body_4_1.part])
